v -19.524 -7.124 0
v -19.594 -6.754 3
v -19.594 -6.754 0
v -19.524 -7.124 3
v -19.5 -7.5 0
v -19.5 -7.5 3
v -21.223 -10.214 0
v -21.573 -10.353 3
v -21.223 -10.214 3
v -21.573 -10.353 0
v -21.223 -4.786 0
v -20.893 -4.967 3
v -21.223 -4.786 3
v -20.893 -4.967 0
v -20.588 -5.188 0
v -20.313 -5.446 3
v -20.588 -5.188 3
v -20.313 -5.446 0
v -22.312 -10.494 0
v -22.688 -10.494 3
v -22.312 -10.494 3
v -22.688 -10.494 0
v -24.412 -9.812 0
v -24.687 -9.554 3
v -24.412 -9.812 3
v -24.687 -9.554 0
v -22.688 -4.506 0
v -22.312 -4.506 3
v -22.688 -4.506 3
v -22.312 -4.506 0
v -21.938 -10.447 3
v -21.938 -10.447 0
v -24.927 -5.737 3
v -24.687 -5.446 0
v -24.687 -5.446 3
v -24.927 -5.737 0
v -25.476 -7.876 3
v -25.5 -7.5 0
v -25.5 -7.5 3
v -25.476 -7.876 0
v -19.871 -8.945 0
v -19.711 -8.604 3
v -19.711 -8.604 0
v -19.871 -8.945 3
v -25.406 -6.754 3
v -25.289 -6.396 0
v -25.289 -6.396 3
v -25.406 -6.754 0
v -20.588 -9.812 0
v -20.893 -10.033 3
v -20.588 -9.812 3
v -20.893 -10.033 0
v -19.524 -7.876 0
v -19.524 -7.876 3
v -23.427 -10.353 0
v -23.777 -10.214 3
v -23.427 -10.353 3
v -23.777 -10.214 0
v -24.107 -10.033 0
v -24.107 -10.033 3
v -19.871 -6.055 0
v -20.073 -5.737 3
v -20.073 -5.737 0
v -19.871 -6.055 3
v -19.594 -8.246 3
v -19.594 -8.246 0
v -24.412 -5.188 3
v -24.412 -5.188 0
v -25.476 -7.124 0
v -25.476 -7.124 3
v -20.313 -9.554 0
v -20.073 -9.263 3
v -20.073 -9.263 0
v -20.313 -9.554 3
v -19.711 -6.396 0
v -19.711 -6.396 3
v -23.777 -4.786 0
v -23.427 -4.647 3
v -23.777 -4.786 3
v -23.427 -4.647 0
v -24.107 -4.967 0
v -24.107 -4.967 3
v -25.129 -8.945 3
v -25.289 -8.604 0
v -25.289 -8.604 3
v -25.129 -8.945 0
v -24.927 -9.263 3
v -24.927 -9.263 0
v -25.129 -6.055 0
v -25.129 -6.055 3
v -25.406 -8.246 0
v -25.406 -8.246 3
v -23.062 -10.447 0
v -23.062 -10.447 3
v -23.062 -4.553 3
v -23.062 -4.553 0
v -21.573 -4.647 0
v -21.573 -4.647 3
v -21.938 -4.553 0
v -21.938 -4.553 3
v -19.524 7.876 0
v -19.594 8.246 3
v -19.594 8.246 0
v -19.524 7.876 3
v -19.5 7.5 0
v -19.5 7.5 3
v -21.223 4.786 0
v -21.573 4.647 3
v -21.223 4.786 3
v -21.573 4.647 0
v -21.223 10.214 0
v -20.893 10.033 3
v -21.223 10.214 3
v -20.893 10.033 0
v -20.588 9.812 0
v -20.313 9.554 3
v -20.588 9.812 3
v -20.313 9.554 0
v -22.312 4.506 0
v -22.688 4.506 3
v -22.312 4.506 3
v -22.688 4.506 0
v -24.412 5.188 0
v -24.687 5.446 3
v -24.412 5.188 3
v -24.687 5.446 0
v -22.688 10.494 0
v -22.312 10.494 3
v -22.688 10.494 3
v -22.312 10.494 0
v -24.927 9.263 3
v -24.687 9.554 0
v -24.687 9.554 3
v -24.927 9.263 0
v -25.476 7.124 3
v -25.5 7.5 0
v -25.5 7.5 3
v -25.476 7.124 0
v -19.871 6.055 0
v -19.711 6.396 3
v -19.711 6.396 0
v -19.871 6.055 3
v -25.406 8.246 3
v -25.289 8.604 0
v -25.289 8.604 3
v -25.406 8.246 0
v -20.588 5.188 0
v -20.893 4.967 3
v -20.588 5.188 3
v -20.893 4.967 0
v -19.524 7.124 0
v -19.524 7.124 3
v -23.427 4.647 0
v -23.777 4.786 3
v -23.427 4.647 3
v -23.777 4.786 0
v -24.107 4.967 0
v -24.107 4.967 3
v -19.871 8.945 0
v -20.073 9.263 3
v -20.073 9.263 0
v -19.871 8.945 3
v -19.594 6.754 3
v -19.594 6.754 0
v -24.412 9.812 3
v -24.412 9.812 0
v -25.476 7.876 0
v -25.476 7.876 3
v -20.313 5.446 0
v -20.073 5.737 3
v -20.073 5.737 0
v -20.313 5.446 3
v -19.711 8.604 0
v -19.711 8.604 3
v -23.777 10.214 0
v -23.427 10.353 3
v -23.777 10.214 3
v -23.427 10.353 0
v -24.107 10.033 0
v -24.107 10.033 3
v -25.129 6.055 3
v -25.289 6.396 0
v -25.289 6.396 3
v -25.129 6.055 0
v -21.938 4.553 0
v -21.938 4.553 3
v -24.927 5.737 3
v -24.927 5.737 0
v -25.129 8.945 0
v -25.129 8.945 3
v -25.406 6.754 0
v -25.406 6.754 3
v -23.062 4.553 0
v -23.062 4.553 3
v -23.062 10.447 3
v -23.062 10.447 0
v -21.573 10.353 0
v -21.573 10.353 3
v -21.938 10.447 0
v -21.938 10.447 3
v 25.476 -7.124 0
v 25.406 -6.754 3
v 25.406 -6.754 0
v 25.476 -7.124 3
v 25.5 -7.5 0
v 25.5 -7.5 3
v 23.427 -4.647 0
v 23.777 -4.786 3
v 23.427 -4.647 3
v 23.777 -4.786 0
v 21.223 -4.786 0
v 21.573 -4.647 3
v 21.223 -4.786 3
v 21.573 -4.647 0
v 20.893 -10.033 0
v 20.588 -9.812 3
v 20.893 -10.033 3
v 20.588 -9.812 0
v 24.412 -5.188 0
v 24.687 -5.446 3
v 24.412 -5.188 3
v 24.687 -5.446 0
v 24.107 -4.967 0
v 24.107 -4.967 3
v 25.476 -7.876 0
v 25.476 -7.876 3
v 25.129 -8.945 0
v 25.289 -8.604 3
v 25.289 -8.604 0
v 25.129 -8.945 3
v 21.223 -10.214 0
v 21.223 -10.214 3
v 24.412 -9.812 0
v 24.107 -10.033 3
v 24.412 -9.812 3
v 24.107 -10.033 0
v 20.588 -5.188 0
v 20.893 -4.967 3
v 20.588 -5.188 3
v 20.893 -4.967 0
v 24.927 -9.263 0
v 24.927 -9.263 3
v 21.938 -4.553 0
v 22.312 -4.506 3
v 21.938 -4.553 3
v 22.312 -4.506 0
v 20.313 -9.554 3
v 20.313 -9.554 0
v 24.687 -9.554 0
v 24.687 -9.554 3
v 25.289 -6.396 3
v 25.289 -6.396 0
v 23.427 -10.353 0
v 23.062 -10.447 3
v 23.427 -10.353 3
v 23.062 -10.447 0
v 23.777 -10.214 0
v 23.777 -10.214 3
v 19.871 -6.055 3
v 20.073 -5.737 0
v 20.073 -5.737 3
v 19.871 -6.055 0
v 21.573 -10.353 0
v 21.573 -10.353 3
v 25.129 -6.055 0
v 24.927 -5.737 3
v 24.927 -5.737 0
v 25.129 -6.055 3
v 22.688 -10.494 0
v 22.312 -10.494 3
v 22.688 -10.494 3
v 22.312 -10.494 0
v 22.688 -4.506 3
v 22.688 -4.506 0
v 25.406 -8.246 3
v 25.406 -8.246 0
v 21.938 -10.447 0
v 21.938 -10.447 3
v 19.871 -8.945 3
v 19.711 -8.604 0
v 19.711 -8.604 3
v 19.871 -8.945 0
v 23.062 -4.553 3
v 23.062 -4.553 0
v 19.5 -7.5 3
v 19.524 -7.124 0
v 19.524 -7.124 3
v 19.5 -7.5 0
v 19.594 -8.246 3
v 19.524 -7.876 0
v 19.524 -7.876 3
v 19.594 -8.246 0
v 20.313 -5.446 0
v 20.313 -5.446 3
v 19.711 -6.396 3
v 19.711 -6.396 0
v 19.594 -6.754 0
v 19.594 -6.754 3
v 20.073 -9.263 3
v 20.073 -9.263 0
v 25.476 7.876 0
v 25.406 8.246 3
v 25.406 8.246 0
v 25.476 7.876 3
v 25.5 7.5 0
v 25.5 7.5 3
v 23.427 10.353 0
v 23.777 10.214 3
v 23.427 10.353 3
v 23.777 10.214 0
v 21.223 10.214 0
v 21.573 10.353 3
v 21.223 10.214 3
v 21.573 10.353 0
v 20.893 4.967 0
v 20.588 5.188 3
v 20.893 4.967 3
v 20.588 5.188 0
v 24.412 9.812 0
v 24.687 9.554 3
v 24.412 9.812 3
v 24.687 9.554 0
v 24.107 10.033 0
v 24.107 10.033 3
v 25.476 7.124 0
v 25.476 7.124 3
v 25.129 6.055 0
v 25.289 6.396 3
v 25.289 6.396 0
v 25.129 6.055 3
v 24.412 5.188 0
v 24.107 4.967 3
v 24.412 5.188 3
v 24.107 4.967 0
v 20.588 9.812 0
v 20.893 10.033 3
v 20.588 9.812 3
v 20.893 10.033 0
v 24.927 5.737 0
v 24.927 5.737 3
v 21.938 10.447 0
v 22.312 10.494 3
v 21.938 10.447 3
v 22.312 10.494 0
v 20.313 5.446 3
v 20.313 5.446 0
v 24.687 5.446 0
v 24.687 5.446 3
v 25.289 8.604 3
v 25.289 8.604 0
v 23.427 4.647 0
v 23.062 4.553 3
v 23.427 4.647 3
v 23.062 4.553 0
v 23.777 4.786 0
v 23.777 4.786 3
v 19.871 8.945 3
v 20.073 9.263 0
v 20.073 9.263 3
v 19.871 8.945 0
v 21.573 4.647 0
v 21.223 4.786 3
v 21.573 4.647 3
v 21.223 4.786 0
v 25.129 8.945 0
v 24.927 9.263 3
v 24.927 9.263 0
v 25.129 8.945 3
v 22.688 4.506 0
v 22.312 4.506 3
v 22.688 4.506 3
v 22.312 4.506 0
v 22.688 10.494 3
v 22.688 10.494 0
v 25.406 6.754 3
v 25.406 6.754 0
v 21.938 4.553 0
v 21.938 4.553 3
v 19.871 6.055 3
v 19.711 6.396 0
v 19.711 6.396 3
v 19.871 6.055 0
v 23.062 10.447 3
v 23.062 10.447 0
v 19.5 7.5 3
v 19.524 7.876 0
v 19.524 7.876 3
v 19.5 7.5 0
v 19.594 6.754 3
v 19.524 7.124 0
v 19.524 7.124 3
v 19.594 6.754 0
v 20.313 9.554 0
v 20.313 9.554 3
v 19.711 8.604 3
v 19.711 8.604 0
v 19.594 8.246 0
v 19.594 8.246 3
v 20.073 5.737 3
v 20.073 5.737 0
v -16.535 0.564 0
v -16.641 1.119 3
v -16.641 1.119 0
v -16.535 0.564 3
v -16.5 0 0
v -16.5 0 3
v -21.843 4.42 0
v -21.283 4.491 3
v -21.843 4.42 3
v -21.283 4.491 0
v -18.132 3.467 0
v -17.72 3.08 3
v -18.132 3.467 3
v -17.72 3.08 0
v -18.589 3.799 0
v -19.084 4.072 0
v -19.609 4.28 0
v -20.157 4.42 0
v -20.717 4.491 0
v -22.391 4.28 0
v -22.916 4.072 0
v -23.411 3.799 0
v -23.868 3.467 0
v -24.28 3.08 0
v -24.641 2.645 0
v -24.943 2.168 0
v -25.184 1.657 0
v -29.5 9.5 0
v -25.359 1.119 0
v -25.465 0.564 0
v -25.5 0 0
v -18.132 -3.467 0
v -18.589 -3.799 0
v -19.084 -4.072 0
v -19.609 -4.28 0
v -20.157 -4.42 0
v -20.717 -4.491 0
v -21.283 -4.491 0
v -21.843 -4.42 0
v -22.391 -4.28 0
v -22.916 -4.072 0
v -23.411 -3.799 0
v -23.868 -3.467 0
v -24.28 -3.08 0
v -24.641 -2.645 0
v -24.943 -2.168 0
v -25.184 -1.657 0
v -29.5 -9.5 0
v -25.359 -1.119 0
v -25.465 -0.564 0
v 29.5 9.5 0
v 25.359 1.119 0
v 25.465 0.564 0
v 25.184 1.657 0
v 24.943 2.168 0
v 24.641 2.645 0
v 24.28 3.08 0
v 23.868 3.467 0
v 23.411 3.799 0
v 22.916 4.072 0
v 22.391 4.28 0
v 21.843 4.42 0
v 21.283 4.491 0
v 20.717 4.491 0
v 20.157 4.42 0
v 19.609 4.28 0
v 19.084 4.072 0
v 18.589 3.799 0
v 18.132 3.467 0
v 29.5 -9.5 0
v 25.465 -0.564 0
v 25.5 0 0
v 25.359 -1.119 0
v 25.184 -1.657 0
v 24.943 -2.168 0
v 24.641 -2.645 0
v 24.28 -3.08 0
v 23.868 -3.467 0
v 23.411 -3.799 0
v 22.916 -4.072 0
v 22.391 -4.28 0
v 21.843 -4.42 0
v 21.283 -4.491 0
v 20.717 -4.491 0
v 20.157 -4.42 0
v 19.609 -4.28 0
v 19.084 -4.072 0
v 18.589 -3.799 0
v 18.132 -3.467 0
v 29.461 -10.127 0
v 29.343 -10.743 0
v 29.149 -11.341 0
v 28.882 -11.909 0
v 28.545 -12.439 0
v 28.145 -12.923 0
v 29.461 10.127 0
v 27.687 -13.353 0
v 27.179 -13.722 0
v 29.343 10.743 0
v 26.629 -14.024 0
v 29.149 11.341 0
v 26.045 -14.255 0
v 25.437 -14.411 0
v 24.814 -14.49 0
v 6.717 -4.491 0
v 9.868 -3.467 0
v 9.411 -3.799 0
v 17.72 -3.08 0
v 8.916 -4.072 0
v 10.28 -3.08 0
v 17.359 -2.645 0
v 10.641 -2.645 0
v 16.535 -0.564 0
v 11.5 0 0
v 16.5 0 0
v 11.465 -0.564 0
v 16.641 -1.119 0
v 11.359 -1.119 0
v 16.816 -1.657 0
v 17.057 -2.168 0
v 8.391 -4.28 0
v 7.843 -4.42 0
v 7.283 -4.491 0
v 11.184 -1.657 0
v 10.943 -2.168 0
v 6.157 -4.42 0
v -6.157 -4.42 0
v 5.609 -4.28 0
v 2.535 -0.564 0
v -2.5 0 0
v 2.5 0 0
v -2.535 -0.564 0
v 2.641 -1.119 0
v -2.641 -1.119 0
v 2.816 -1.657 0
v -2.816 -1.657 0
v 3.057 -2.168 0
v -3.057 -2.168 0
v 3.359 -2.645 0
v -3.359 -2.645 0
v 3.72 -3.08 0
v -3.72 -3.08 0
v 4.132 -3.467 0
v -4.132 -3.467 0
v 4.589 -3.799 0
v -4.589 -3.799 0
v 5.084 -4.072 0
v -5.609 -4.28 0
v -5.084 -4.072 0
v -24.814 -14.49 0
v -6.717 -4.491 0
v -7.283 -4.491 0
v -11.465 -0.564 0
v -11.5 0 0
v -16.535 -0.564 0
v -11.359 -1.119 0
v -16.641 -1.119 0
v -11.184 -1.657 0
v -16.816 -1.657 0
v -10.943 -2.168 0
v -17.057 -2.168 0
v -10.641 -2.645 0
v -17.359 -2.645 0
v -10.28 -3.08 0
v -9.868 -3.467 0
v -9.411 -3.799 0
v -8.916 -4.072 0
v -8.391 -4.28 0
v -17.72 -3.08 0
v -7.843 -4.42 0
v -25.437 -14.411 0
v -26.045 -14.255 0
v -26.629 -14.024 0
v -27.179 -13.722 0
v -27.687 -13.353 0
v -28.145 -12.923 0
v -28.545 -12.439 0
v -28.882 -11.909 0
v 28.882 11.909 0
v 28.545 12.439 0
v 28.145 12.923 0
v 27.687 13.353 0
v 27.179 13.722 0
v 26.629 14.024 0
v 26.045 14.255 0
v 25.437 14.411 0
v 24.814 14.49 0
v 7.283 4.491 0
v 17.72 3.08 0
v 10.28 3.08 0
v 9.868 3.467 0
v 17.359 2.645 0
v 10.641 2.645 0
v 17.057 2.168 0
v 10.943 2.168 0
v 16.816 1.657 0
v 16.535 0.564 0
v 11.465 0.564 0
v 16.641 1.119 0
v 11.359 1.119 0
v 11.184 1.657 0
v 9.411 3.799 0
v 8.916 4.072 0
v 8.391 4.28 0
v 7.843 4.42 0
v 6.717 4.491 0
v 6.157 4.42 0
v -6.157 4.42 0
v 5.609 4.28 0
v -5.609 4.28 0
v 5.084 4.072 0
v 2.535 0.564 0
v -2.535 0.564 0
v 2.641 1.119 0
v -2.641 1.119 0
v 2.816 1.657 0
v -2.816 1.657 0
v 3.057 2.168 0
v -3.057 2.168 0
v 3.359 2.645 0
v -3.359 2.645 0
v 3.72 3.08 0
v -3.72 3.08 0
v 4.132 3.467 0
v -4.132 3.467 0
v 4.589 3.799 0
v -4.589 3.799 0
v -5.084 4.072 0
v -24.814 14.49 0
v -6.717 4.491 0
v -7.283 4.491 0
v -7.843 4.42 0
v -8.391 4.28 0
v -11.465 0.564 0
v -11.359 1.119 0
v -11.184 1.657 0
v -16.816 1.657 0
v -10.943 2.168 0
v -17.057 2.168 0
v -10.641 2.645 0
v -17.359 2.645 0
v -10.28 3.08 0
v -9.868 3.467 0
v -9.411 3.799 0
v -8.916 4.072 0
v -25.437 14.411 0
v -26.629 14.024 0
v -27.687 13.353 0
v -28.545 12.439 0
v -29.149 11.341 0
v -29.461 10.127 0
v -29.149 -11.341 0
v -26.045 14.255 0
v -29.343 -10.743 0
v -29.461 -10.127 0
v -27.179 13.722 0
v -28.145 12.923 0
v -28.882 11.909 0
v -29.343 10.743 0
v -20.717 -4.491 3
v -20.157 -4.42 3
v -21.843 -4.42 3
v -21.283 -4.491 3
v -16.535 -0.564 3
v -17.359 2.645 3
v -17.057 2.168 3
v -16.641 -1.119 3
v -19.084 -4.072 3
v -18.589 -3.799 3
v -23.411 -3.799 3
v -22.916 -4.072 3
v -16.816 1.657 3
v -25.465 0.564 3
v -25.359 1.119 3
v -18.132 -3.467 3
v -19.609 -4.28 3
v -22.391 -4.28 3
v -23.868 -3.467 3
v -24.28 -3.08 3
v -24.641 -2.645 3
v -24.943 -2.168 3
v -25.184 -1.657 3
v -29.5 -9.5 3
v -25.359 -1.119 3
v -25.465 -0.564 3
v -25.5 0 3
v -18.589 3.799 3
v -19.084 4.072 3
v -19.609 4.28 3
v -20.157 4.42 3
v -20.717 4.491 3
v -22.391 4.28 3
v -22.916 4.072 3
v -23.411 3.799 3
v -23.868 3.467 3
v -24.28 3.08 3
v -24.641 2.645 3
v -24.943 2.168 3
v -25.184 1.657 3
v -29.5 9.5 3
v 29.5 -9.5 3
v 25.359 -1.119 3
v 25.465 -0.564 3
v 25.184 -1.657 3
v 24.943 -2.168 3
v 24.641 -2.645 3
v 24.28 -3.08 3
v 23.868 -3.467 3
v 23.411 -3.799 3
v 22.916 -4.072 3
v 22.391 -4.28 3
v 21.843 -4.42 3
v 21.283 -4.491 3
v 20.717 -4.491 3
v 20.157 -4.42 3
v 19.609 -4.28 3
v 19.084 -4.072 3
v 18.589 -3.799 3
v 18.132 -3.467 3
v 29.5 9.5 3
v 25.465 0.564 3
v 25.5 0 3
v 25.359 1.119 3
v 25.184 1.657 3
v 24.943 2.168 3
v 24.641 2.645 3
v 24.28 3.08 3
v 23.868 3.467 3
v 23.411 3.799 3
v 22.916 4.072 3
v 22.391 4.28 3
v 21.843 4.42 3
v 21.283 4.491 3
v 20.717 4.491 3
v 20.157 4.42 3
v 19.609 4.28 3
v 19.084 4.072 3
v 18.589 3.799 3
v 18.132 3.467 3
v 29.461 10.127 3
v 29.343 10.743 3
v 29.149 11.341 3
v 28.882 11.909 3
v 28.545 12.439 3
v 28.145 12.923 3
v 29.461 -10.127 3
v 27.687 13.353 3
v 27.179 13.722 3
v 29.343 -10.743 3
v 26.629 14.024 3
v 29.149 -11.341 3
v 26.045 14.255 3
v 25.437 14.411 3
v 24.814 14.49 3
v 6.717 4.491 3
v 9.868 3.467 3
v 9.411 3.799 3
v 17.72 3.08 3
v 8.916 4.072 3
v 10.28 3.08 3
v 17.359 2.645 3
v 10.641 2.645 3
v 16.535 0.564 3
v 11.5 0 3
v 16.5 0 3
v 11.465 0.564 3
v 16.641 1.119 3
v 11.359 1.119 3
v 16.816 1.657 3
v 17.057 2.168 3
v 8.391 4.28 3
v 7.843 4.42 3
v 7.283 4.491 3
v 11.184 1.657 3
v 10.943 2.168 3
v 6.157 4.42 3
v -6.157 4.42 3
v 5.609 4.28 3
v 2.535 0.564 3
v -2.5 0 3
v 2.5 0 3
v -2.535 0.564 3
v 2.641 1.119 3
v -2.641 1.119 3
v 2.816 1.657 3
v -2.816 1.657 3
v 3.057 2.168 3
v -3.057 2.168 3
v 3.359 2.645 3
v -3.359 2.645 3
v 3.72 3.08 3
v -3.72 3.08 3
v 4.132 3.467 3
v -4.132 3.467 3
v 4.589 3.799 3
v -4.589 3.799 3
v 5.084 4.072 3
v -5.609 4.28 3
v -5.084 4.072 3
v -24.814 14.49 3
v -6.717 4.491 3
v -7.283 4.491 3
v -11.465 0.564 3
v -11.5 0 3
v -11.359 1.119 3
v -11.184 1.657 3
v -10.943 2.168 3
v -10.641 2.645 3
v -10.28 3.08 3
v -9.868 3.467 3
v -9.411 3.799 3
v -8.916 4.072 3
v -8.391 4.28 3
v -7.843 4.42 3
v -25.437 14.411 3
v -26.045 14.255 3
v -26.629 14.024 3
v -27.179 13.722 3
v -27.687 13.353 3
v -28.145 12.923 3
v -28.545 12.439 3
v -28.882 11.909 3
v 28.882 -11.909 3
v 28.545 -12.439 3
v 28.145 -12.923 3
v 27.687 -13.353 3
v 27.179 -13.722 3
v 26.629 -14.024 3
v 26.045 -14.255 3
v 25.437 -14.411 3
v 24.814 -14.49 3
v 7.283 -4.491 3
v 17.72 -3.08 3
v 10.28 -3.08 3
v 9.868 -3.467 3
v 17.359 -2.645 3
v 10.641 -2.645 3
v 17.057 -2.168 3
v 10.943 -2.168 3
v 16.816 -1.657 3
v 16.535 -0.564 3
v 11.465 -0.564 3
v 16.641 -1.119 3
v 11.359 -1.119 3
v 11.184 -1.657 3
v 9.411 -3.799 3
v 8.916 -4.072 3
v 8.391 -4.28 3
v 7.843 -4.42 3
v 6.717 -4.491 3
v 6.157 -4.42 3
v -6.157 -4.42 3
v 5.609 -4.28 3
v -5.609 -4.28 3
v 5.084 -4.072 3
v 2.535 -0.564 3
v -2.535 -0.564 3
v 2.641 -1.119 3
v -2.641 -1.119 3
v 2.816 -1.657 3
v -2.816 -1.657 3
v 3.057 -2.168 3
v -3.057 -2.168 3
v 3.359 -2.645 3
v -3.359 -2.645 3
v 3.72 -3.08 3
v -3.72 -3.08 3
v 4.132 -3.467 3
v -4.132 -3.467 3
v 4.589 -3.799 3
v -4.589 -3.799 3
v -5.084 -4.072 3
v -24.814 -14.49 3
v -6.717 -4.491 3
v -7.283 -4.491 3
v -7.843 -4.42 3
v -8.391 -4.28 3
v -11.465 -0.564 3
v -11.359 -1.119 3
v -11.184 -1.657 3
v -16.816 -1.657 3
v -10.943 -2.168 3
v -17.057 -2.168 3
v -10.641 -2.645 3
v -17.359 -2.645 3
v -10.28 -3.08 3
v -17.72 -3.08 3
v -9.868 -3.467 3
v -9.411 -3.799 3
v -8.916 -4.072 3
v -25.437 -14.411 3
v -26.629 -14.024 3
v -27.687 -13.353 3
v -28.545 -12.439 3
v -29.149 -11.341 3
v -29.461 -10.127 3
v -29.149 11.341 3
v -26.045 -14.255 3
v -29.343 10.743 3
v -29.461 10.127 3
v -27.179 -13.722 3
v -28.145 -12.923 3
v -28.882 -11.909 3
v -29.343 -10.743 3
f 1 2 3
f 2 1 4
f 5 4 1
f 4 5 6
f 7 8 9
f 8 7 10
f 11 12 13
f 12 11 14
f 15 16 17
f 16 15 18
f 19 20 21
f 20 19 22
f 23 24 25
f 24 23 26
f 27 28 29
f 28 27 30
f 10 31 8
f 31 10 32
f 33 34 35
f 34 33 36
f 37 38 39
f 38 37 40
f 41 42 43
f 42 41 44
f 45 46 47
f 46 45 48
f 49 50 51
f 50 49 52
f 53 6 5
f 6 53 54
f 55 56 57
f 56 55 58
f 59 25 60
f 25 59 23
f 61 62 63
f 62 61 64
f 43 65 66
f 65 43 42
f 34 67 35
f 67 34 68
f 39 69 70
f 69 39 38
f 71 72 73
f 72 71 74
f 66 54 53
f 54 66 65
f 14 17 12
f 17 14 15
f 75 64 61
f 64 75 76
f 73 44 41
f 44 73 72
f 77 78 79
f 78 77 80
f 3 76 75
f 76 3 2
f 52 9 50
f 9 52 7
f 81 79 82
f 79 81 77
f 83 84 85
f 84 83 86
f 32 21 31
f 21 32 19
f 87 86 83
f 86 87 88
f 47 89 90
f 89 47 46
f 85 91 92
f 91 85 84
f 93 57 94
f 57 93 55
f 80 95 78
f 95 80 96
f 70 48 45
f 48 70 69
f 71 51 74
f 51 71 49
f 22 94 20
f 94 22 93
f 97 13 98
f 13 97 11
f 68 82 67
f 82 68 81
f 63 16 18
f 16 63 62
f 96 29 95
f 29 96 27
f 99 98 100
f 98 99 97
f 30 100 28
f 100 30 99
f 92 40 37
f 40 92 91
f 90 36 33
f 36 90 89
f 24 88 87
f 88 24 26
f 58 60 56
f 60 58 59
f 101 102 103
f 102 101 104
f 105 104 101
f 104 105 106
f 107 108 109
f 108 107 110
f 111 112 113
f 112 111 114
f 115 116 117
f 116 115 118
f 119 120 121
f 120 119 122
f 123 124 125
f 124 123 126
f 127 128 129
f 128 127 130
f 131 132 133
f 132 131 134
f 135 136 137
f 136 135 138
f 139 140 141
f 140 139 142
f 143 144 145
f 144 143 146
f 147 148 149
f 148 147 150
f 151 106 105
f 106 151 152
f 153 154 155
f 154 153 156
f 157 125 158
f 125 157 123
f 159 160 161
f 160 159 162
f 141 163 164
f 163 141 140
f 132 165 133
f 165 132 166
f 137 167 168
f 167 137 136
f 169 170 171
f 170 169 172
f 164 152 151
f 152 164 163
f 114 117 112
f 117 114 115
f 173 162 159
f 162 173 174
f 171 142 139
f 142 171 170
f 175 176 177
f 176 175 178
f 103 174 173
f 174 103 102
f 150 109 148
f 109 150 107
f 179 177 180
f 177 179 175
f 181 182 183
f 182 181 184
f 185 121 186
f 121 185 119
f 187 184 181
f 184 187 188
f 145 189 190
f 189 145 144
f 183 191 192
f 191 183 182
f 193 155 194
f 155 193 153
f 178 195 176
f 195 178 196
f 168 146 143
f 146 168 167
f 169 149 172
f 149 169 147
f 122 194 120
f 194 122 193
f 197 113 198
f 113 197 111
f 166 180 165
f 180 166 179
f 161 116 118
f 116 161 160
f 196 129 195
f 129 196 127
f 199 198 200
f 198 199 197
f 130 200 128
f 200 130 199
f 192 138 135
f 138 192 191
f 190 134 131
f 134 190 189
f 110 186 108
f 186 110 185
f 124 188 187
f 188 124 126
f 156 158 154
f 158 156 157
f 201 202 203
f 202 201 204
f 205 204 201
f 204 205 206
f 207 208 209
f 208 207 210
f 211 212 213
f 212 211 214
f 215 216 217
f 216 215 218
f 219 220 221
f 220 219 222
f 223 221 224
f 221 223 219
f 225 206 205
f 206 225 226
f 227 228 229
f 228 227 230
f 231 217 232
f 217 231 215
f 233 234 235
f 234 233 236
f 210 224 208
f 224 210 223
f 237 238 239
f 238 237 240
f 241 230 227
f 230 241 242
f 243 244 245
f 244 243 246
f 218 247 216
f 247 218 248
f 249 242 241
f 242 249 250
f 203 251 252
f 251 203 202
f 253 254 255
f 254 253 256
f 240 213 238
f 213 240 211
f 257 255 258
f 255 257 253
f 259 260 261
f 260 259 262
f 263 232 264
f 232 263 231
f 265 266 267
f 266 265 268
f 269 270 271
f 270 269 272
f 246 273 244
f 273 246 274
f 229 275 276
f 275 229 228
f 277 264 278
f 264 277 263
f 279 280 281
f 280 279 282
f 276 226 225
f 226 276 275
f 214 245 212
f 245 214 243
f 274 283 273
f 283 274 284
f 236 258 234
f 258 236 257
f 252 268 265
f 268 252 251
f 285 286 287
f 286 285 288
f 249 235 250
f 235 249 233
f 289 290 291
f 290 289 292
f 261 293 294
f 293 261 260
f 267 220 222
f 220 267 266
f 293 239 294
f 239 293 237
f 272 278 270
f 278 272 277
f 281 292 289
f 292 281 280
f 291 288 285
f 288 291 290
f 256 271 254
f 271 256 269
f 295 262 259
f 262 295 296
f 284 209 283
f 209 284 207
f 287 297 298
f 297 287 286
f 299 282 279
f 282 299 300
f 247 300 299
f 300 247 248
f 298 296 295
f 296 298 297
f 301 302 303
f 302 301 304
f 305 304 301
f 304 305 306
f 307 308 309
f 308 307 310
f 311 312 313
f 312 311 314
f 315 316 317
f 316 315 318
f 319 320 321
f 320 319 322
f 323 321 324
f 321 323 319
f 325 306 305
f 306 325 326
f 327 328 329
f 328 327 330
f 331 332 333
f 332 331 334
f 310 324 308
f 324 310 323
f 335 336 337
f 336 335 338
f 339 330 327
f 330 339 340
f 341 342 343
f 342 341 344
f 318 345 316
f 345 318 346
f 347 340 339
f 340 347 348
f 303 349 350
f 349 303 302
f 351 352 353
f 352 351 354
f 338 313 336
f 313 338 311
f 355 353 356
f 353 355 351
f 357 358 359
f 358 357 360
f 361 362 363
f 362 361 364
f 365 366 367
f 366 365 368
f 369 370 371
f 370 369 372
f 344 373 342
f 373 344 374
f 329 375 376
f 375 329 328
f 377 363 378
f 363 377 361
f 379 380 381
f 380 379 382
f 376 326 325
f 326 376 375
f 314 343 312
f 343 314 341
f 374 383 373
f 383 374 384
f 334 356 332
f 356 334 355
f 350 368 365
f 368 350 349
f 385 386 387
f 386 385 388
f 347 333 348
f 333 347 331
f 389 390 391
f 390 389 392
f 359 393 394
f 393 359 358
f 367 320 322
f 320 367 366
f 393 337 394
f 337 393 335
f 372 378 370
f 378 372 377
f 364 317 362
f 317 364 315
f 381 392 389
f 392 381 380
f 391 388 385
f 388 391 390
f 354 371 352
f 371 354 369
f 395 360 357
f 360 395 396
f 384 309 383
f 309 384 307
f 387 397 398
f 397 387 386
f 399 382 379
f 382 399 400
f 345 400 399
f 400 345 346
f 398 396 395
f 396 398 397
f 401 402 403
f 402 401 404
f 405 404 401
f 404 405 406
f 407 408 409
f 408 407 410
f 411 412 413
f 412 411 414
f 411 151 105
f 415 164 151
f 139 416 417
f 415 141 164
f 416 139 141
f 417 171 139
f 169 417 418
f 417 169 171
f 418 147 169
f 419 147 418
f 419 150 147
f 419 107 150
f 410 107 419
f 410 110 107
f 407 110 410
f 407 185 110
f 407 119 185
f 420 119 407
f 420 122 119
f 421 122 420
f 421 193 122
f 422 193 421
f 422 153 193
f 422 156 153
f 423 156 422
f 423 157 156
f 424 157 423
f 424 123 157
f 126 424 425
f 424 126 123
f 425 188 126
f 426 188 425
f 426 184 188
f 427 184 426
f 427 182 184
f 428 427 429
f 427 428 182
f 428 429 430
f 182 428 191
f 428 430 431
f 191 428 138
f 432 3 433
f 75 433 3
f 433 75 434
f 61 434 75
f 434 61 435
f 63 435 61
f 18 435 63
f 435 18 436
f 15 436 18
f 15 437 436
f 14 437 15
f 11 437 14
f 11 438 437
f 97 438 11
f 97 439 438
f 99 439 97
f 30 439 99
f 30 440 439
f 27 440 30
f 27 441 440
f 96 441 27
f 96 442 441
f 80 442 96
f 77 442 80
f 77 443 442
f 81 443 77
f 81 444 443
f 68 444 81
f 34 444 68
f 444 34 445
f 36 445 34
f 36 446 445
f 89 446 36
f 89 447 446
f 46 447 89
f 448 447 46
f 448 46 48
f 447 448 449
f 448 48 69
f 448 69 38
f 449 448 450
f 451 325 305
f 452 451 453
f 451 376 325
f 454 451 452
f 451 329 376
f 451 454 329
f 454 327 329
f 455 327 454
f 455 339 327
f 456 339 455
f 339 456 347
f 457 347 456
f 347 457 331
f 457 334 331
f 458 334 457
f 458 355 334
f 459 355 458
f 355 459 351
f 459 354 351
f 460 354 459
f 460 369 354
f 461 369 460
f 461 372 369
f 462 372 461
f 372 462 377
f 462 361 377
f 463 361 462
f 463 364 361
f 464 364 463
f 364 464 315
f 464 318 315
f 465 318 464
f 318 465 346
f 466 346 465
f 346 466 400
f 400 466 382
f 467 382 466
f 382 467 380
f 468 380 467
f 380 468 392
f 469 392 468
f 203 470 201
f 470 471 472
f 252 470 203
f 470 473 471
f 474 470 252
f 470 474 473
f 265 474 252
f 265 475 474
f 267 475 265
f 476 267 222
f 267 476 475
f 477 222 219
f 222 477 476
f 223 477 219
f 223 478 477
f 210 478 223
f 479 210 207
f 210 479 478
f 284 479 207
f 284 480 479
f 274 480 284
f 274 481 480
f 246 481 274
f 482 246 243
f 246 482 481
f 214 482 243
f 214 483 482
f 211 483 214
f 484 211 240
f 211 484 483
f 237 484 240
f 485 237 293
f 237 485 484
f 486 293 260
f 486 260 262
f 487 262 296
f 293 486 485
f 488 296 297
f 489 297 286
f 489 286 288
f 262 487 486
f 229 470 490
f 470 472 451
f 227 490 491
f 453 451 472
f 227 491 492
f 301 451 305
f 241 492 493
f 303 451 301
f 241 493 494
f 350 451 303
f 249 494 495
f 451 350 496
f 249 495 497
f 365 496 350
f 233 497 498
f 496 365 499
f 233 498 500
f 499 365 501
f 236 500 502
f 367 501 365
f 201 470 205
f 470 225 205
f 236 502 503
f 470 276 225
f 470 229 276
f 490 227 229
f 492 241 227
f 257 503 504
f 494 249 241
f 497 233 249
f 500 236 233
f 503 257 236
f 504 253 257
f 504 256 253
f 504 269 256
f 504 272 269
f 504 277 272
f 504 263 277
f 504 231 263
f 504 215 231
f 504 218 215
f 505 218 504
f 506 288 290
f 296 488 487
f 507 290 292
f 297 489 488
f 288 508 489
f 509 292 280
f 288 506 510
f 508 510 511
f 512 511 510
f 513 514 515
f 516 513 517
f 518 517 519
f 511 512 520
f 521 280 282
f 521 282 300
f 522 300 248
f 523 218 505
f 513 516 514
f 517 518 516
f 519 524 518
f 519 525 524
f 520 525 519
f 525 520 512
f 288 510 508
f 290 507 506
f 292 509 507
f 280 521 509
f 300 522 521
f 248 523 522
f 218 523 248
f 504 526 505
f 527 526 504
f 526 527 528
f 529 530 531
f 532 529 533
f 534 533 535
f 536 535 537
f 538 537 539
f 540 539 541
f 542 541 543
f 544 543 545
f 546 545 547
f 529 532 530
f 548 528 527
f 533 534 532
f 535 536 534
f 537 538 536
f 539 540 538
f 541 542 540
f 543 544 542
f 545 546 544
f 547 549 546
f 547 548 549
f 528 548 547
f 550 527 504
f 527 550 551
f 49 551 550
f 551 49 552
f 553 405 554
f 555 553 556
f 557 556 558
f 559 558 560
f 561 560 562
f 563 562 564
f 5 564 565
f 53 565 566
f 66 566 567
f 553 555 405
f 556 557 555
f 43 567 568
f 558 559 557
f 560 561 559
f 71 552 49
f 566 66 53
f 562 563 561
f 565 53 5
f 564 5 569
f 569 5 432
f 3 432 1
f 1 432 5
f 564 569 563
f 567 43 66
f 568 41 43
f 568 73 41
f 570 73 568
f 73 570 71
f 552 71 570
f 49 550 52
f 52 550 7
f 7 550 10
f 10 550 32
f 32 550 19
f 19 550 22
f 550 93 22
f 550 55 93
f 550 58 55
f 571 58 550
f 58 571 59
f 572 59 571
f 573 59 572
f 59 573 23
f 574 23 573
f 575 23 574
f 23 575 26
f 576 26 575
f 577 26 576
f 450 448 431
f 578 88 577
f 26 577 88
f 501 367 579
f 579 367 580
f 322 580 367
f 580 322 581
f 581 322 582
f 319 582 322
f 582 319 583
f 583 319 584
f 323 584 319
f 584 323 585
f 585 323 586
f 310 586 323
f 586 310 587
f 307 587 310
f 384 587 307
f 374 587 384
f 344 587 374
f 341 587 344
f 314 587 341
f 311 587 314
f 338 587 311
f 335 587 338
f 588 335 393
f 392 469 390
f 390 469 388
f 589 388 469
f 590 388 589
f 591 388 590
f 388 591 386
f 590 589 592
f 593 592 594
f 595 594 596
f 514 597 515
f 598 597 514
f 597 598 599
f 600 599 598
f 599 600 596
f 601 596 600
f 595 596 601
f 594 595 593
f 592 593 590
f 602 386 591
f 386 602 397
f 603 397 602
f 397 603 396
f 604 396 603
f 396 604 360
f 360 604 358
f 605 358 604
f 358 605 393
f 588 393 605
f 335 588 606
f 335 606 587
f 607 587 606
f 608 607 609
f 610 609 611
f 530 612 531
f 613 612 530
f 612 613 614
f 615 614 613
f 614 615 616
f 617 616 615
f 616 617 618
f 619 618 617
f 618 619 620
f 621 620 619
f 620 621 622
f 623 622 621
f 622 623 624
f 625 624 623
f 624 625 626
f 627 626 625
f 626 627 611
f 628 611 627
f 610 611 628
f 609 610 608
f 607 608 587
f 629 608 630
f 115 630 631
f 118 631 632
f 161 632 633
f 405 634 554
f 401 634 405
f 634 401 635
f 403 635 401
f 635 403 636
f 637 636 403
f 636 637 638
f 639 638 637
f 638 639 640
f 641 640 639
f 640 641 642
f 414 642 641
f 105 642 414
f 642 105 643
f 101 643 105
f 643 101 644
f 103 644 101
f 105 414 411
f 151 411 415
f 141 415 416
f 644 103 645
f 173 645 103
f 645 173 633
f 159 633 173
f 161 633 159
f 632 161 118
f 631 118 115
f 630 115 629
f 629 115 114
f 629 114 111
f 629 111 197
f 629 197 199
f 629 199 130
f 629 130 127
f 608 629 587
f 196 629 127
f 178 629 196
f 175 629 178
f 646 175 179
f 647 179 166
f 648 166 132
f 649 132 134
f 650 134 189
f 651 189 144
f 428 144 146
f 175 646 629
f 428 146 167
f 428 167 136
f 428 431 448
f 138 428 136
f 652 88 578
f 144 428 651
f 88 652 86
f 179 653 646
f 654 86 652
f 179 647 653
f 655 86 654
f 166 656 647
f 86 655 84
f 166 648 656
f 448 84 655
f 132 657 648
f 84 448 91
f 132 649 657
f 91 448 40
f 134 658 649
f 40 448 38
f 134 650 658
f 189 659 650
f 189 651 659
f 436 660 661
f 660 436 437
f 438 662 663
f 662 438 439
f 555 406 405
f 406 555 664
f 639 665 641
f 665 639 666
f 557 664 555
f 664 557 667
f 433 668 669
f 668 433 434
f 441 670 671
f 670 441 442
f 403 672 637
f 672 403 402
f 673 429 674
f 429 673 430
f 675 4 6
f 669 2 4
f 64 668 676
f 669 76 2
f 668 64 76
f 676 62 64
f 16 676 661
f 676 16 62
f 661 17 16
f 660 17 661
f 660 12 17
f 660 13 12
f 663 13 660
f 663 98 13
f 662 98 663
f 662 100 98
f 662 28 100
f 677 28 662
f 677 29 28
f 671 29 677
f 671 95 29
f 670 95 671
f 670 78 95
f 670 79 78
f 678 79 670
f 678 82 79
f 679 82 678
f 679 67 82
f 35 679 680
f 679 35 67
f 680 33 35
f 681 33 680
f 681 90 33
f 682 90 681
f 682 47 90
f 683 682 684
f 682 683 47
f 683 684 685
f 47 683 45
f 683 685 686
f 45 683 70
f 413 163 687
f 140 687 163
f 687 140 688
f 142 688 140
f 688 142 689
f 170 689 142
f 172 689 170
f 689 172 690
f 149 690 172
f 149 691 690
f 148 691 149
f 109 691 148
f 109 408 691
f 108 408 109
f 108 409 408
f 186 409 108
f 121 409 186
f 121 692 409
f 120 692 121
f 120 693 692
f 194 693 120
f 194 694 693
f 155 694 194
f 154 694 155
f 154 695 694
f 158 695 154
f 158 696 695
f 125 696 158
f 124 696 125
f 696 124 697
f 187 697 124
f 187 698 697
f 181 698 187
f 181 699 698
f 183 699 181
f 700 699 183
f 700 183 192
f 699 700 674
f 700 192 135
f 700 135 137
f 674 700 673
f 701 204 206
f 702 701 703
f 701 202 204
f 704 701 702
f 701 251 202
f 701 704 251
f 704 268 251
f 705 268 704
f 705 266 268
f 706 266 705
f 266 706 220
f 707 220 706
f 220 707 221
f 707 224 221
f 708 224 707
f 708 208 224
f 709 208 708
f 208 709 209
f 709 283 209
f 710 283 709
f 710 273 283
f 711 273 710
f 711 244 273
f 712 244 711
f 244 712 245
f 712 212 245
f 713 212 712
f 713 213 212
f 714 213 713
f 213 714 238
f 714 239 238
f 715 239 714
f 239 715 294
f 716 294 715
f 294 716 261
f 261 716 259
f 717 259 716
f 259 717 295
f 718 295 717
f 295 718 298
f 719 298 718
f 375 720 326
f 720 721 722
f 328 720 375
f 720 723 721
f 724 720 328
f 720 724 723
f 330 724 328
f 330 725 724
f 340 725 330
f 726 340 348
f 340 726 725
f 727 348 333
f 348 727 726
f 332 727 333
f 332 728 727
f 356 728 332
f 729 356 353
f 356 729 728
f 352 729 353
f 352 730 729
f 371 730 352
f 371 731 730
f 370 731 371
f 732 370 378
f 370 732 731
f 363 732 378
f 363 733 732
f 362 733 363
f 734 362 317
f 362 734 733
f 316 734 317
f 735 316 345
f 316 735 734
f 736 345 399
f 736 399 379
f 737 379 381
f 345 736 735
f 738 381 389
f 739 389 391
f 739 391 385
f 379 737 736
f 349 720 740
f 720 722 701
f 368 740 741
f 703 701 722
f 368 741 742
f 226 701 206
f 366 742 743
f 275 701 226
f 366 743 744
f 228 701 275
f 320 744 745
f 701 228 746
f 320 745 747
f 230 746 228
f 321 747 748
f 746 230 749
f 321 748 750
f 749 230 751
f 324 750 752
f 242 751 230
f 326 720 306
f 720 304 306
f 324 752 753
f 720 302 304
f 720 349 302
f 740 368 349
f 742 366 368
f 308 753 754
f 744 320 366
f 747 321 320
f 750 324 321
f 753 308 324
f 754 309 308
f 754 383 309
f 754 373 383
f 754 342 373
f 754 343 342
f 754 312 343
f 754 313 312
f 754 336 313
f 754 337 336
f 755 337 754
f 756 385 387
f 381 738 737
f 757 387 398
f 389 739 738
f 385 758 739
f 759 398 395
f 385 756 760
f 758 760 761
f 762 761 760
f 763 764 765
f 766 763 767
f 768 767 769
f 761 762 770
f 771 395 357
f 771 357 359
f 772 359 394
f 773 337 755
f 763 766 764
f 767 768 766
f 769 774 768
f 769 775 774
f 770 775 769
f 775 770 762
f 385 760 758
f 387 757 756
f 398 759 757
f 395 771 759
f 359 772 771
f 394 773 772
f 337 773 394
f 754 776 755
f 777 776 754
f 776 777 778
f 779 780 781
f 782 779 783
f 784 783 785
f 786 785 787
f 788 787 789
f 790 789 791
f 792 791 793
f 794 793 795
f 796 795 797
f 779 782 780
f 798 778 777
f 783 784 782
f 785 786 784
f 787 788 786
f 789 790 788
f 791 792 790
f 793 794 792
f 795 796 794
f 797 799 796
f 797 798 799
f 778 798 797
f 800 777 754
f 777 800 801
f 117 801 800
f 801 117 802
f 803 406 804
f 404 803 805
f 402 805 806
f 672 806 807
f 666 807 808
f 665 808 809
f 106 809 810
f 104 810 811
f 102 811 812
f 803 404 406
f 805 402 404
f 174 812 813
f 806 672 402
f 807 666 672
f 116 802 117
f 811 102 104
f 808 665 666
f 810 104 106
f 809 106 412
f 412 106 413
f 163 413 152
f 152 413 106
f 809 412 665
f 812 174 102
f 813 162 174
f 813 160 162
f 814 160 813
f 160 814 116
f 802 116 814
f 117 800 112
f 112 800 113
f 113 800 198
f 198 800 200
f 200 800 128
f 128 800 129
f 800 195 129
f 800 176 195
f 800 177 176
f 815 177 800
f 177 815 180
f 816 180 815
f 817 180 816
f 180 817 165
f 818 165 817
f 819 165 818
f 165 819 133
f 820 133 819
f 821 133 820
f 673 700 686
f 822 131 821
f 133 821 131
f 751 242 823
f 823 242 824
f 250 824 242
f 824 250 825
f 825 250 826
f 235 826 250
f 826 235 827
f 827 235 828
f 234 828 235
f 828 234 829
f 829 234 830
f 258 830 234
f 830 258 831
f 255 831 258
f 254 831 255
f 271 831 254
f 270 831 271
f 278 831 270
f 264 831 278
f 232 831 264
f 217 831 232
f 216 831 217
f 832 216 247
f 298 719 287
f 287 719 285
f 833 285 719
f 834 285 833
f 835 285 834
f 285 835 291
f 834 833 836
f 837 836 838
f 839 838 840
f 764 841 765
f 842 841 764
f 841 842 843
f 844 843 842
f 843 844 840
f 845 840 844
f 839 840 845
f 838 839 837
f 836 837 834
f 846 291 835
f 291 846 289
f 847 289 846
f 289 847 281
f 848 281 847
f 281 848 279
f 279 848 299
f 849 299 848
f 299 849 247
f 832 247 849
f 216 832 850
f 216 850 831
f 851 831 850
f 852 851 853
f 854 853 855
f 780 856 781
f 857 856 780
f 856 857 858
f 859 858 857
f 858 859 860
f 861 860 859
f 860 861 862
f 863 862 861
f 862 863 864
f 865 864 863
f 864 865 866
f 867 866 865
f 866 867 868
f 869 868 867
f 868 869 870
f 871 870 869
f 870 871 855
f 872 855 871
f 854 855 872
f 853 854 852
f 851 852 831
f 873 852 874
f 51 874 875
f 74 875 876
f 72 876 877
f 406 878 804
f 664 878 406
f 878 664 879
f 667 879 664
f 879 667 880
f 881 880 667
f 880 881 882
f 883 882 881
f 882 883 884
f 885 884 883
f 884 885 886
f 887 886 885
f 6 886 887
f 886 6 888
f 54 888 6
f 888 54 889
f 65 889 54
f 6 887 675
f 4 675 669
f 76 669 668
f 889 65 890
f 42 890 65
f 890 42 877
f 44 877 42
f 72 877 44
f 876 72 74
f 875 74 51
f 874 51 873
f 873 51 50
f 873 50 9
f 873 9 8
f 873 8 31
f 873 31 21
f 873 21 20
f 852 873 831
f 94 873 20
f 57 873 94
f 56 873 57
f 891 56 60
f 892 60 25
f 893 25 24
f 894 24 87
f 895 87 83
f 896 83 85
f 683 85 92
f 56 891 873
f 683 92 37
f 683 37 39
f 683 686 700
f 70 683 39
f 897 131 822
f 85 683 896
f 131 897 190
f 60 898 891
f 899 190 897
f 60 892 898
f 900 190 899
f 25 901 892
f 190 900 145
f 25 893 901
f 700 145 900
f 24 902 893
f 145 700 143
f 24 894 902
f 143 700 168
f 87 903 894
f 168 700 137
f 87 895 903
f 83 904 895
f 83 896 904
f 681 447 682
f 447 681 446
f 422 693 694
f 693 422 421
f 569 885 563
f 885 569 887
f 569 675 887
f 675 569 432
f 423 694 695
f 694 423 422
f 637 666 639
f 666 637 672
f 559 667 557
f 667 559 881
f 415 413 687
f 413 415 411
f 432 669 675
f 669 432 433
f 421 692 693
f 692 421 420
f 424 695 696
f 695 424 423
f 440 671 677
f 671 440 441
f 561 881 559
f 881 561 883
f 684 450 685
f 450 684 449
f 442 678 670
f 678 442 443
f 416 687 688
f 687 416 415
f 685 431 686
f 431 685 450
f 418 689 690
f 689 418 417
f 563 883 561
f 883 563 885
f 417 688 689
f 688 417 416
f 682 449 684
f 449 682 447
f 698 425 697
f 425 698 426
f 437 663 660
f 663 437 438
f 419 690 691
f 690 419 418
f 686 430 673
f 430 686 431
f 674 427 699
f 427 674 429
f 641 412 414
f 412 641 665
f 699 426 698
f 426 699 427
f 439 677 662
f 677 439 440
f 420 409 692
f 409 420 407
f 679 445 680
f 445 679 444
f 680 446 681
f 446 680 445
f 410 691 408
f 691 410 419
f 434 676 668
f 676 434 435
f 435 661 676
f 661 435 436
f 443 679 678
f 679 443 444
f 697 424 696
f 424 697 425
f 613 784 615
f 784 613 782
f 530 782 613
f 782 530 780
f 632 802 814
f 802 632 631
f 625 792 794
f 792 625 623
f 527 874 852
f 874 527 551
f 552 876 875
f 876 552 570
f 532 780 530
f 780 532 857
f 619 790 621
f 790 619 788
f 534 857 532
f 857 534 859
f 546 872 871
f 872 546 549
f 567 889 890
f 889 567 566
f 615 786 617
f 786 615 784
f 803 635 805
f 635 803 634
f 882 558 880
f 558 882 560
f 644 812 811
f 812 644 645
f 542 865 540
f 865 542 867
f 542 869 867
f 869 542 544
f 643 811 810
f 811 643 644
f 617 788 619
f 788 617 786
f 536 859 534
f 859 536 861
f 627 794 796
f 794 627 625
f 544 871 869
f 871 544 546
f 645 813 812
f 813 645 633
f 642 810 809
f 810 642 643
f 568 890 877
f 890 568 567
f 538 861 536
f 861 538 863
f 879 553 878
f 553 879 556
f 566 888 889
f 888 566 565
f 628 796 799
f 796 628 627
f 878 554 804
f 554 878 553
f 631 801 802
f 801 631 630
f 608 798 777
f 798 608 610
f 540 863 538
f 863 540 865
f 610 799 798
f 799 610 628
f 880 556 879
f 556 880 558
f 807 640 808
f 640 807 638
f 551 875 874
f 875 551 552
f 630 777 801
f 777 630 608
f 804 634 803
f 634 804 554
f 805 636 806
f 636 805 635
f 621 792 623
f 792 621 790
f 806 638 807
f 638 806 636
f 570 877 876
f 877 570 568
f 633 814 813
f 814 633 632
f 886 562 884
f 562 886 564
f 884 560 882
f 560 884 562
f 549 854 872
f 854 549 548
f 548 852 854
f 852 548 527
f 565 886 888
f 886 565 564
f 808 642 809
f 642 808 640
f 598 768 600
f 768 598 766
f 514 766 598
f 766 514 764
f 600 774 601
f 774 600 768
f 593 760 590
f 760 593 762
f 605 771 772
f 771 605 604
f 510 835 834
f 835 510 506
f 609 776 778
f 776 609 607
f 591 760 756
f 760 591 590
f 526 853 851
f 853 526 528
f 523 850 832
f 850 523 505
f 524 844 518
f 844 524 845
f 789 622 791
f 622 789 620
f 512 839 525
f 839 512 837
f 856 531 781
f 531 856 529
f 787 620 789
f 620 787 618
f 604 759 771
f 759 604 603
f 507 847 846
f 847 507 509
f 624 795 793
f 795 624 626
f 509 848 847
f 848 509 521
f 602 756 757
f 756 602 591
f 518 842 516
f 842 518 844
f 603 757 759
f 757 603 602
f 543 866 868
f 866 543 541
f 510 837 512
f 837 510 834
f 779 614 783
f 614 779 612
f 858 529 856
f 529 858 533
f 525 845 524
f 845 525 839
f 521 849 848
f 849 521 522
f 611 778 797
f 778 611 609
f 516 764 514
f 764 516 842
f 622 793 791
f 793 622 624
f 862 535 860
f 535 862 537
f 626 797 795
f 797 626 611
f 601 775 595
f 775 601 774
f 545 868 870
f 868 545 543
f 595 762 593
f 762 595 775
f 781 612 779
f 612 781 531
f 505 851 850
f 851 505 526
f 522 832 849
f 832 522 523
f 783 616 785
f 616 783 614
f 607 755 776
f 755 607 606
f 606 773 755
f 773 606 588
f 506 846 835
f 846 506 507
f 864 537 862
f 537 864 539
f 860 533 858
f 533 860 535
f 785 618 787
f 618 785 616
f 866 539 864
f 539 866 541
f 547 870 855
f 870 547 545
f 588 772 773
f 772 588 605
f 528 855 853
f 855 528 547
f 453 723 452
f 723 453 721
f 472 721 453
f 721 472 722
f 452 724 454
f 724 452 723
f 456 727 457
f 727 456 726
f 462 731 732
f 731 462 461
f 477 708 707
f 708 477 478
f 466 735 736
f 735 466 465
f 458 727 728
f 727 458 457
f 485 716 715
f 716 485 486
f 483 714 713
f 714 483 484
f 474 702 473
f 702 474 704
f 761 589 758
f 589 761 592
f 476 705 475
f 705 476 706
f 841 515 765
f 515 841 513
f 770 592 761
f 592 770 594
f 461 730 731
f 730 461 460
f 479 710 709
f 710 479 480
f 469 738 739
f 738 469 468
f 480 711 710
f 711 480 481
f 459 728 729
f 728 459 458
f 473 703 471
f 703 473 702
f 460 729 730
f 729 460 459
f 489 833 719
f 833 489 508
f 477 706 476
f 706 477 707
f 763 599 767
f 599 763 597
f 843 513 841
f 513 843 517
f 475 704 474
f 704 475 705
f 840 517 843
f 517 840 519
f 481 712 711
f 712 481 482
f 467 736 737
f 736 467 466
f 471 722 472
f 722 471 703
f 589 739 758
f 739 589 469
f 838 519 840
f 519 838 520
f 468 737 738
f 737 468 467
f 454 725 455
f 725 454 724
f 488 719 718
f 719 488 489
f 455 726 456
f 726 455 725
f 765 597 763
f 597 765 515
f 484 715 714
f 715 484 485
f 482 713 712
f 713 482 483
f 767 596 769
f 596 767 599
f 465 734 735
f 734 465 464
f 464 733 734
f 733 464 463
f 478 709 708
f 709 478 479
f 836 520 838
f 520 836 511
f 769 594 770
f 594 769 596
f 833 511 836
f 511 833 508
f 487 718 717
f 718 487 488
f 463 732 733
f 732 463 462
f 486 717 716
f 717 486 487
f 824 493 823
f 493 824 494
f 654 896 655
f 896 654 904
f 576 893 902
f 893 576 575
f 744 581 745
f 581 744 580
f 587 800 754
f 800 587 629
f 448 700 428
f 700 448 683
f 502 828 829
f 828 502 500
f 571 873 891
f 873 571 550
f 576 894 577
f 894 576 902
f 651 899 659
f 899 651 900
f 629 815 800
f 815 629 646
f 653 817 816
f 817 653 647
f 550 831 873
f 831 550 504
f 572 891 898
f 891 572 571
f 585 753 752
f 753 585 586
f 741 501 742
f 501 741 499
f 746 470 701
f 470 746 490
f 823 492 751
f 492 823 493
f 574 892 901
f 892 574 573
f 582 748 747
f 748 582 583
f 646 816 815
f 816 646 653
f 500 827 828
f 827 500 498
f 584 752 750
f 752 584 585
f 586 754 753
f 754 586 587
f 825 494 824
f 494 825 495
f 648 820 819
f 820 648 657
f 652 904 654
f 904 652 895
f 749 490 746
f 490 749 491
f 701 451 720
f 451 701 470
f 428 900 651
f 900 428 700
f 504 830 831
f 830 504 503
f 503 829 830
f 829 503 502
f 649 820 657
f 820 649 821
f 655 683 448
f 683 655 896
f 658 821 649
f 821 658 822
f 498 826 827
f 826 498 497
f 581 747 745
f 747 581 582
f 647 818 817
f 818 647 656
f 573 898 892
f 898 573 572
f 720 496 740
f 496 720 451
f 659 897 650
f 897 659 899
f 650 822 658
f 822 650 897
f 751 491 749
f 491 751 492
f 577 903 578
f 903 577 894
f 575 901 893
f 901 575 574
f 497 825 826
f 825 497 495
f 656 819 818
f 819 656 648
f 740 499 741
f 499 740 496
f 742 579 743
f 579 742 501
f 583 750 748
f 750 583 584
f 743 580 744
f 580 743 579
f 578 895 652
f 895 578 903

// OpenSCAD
$fn = 50;


difference() {
	union() {
		hull() {
			translate(v = [-24.5000000000, 9.5000000000, 0]) {
				cylinder(h = 3, r = 5);
			}
			translate(v = [24.5000000000, 9.5000000000, 0]) {
				cylinder(h = 3, r = 5);
			}
			translate(v = [-24.5000000000, -9.5000000000, 0]) {
				cylinder(h = 3, r = 5);
			}
			translate(v = [24.5000000000, -9.5000000000, 0]) {
				cylinder(h = 3, r = 5);
			}
		}
	}
	union() {
		#translate(v = [-22.5000000000, -7.5000000000, -100.0000000000]) {
			cylinder(h = 200, r = 3.0000000000);
		}
		#translate(v = [-22.5000000000, 7.5000000000, -100.0000000000]) {
			cylinder(h = 200, r = 3.0000000000);
		}
		#translate(v = [22.5000000000, -7.5000000000, -100.0000000000]) {
			cylinder(h = 200, r = 3.0000000000);
		}
		#translate(v = [22.5000000000, 7.5000000000, -100.0000000000]) {
			cylinder(h = 200, r = 3.0000000000);
		}
		#translate(v = [-21.0000000000, 0, 0]) {
			cylinder(h = 3, r = 4.5000000000);
		}
		#translate(v = [-7.0000000000, 0, 0]) {
			cylinder(h = 3, r = 4.5000000000);
		}
		#translate(v = [7.0000000000, 0, 0]) {
			cylinder(h = 3, r = 4.5000000000);
		}
		#translate(v = [21.0000000000, 0, 0]) {
			cylinder(h = 3, r = 4.5000000000);
		}
	}
}
